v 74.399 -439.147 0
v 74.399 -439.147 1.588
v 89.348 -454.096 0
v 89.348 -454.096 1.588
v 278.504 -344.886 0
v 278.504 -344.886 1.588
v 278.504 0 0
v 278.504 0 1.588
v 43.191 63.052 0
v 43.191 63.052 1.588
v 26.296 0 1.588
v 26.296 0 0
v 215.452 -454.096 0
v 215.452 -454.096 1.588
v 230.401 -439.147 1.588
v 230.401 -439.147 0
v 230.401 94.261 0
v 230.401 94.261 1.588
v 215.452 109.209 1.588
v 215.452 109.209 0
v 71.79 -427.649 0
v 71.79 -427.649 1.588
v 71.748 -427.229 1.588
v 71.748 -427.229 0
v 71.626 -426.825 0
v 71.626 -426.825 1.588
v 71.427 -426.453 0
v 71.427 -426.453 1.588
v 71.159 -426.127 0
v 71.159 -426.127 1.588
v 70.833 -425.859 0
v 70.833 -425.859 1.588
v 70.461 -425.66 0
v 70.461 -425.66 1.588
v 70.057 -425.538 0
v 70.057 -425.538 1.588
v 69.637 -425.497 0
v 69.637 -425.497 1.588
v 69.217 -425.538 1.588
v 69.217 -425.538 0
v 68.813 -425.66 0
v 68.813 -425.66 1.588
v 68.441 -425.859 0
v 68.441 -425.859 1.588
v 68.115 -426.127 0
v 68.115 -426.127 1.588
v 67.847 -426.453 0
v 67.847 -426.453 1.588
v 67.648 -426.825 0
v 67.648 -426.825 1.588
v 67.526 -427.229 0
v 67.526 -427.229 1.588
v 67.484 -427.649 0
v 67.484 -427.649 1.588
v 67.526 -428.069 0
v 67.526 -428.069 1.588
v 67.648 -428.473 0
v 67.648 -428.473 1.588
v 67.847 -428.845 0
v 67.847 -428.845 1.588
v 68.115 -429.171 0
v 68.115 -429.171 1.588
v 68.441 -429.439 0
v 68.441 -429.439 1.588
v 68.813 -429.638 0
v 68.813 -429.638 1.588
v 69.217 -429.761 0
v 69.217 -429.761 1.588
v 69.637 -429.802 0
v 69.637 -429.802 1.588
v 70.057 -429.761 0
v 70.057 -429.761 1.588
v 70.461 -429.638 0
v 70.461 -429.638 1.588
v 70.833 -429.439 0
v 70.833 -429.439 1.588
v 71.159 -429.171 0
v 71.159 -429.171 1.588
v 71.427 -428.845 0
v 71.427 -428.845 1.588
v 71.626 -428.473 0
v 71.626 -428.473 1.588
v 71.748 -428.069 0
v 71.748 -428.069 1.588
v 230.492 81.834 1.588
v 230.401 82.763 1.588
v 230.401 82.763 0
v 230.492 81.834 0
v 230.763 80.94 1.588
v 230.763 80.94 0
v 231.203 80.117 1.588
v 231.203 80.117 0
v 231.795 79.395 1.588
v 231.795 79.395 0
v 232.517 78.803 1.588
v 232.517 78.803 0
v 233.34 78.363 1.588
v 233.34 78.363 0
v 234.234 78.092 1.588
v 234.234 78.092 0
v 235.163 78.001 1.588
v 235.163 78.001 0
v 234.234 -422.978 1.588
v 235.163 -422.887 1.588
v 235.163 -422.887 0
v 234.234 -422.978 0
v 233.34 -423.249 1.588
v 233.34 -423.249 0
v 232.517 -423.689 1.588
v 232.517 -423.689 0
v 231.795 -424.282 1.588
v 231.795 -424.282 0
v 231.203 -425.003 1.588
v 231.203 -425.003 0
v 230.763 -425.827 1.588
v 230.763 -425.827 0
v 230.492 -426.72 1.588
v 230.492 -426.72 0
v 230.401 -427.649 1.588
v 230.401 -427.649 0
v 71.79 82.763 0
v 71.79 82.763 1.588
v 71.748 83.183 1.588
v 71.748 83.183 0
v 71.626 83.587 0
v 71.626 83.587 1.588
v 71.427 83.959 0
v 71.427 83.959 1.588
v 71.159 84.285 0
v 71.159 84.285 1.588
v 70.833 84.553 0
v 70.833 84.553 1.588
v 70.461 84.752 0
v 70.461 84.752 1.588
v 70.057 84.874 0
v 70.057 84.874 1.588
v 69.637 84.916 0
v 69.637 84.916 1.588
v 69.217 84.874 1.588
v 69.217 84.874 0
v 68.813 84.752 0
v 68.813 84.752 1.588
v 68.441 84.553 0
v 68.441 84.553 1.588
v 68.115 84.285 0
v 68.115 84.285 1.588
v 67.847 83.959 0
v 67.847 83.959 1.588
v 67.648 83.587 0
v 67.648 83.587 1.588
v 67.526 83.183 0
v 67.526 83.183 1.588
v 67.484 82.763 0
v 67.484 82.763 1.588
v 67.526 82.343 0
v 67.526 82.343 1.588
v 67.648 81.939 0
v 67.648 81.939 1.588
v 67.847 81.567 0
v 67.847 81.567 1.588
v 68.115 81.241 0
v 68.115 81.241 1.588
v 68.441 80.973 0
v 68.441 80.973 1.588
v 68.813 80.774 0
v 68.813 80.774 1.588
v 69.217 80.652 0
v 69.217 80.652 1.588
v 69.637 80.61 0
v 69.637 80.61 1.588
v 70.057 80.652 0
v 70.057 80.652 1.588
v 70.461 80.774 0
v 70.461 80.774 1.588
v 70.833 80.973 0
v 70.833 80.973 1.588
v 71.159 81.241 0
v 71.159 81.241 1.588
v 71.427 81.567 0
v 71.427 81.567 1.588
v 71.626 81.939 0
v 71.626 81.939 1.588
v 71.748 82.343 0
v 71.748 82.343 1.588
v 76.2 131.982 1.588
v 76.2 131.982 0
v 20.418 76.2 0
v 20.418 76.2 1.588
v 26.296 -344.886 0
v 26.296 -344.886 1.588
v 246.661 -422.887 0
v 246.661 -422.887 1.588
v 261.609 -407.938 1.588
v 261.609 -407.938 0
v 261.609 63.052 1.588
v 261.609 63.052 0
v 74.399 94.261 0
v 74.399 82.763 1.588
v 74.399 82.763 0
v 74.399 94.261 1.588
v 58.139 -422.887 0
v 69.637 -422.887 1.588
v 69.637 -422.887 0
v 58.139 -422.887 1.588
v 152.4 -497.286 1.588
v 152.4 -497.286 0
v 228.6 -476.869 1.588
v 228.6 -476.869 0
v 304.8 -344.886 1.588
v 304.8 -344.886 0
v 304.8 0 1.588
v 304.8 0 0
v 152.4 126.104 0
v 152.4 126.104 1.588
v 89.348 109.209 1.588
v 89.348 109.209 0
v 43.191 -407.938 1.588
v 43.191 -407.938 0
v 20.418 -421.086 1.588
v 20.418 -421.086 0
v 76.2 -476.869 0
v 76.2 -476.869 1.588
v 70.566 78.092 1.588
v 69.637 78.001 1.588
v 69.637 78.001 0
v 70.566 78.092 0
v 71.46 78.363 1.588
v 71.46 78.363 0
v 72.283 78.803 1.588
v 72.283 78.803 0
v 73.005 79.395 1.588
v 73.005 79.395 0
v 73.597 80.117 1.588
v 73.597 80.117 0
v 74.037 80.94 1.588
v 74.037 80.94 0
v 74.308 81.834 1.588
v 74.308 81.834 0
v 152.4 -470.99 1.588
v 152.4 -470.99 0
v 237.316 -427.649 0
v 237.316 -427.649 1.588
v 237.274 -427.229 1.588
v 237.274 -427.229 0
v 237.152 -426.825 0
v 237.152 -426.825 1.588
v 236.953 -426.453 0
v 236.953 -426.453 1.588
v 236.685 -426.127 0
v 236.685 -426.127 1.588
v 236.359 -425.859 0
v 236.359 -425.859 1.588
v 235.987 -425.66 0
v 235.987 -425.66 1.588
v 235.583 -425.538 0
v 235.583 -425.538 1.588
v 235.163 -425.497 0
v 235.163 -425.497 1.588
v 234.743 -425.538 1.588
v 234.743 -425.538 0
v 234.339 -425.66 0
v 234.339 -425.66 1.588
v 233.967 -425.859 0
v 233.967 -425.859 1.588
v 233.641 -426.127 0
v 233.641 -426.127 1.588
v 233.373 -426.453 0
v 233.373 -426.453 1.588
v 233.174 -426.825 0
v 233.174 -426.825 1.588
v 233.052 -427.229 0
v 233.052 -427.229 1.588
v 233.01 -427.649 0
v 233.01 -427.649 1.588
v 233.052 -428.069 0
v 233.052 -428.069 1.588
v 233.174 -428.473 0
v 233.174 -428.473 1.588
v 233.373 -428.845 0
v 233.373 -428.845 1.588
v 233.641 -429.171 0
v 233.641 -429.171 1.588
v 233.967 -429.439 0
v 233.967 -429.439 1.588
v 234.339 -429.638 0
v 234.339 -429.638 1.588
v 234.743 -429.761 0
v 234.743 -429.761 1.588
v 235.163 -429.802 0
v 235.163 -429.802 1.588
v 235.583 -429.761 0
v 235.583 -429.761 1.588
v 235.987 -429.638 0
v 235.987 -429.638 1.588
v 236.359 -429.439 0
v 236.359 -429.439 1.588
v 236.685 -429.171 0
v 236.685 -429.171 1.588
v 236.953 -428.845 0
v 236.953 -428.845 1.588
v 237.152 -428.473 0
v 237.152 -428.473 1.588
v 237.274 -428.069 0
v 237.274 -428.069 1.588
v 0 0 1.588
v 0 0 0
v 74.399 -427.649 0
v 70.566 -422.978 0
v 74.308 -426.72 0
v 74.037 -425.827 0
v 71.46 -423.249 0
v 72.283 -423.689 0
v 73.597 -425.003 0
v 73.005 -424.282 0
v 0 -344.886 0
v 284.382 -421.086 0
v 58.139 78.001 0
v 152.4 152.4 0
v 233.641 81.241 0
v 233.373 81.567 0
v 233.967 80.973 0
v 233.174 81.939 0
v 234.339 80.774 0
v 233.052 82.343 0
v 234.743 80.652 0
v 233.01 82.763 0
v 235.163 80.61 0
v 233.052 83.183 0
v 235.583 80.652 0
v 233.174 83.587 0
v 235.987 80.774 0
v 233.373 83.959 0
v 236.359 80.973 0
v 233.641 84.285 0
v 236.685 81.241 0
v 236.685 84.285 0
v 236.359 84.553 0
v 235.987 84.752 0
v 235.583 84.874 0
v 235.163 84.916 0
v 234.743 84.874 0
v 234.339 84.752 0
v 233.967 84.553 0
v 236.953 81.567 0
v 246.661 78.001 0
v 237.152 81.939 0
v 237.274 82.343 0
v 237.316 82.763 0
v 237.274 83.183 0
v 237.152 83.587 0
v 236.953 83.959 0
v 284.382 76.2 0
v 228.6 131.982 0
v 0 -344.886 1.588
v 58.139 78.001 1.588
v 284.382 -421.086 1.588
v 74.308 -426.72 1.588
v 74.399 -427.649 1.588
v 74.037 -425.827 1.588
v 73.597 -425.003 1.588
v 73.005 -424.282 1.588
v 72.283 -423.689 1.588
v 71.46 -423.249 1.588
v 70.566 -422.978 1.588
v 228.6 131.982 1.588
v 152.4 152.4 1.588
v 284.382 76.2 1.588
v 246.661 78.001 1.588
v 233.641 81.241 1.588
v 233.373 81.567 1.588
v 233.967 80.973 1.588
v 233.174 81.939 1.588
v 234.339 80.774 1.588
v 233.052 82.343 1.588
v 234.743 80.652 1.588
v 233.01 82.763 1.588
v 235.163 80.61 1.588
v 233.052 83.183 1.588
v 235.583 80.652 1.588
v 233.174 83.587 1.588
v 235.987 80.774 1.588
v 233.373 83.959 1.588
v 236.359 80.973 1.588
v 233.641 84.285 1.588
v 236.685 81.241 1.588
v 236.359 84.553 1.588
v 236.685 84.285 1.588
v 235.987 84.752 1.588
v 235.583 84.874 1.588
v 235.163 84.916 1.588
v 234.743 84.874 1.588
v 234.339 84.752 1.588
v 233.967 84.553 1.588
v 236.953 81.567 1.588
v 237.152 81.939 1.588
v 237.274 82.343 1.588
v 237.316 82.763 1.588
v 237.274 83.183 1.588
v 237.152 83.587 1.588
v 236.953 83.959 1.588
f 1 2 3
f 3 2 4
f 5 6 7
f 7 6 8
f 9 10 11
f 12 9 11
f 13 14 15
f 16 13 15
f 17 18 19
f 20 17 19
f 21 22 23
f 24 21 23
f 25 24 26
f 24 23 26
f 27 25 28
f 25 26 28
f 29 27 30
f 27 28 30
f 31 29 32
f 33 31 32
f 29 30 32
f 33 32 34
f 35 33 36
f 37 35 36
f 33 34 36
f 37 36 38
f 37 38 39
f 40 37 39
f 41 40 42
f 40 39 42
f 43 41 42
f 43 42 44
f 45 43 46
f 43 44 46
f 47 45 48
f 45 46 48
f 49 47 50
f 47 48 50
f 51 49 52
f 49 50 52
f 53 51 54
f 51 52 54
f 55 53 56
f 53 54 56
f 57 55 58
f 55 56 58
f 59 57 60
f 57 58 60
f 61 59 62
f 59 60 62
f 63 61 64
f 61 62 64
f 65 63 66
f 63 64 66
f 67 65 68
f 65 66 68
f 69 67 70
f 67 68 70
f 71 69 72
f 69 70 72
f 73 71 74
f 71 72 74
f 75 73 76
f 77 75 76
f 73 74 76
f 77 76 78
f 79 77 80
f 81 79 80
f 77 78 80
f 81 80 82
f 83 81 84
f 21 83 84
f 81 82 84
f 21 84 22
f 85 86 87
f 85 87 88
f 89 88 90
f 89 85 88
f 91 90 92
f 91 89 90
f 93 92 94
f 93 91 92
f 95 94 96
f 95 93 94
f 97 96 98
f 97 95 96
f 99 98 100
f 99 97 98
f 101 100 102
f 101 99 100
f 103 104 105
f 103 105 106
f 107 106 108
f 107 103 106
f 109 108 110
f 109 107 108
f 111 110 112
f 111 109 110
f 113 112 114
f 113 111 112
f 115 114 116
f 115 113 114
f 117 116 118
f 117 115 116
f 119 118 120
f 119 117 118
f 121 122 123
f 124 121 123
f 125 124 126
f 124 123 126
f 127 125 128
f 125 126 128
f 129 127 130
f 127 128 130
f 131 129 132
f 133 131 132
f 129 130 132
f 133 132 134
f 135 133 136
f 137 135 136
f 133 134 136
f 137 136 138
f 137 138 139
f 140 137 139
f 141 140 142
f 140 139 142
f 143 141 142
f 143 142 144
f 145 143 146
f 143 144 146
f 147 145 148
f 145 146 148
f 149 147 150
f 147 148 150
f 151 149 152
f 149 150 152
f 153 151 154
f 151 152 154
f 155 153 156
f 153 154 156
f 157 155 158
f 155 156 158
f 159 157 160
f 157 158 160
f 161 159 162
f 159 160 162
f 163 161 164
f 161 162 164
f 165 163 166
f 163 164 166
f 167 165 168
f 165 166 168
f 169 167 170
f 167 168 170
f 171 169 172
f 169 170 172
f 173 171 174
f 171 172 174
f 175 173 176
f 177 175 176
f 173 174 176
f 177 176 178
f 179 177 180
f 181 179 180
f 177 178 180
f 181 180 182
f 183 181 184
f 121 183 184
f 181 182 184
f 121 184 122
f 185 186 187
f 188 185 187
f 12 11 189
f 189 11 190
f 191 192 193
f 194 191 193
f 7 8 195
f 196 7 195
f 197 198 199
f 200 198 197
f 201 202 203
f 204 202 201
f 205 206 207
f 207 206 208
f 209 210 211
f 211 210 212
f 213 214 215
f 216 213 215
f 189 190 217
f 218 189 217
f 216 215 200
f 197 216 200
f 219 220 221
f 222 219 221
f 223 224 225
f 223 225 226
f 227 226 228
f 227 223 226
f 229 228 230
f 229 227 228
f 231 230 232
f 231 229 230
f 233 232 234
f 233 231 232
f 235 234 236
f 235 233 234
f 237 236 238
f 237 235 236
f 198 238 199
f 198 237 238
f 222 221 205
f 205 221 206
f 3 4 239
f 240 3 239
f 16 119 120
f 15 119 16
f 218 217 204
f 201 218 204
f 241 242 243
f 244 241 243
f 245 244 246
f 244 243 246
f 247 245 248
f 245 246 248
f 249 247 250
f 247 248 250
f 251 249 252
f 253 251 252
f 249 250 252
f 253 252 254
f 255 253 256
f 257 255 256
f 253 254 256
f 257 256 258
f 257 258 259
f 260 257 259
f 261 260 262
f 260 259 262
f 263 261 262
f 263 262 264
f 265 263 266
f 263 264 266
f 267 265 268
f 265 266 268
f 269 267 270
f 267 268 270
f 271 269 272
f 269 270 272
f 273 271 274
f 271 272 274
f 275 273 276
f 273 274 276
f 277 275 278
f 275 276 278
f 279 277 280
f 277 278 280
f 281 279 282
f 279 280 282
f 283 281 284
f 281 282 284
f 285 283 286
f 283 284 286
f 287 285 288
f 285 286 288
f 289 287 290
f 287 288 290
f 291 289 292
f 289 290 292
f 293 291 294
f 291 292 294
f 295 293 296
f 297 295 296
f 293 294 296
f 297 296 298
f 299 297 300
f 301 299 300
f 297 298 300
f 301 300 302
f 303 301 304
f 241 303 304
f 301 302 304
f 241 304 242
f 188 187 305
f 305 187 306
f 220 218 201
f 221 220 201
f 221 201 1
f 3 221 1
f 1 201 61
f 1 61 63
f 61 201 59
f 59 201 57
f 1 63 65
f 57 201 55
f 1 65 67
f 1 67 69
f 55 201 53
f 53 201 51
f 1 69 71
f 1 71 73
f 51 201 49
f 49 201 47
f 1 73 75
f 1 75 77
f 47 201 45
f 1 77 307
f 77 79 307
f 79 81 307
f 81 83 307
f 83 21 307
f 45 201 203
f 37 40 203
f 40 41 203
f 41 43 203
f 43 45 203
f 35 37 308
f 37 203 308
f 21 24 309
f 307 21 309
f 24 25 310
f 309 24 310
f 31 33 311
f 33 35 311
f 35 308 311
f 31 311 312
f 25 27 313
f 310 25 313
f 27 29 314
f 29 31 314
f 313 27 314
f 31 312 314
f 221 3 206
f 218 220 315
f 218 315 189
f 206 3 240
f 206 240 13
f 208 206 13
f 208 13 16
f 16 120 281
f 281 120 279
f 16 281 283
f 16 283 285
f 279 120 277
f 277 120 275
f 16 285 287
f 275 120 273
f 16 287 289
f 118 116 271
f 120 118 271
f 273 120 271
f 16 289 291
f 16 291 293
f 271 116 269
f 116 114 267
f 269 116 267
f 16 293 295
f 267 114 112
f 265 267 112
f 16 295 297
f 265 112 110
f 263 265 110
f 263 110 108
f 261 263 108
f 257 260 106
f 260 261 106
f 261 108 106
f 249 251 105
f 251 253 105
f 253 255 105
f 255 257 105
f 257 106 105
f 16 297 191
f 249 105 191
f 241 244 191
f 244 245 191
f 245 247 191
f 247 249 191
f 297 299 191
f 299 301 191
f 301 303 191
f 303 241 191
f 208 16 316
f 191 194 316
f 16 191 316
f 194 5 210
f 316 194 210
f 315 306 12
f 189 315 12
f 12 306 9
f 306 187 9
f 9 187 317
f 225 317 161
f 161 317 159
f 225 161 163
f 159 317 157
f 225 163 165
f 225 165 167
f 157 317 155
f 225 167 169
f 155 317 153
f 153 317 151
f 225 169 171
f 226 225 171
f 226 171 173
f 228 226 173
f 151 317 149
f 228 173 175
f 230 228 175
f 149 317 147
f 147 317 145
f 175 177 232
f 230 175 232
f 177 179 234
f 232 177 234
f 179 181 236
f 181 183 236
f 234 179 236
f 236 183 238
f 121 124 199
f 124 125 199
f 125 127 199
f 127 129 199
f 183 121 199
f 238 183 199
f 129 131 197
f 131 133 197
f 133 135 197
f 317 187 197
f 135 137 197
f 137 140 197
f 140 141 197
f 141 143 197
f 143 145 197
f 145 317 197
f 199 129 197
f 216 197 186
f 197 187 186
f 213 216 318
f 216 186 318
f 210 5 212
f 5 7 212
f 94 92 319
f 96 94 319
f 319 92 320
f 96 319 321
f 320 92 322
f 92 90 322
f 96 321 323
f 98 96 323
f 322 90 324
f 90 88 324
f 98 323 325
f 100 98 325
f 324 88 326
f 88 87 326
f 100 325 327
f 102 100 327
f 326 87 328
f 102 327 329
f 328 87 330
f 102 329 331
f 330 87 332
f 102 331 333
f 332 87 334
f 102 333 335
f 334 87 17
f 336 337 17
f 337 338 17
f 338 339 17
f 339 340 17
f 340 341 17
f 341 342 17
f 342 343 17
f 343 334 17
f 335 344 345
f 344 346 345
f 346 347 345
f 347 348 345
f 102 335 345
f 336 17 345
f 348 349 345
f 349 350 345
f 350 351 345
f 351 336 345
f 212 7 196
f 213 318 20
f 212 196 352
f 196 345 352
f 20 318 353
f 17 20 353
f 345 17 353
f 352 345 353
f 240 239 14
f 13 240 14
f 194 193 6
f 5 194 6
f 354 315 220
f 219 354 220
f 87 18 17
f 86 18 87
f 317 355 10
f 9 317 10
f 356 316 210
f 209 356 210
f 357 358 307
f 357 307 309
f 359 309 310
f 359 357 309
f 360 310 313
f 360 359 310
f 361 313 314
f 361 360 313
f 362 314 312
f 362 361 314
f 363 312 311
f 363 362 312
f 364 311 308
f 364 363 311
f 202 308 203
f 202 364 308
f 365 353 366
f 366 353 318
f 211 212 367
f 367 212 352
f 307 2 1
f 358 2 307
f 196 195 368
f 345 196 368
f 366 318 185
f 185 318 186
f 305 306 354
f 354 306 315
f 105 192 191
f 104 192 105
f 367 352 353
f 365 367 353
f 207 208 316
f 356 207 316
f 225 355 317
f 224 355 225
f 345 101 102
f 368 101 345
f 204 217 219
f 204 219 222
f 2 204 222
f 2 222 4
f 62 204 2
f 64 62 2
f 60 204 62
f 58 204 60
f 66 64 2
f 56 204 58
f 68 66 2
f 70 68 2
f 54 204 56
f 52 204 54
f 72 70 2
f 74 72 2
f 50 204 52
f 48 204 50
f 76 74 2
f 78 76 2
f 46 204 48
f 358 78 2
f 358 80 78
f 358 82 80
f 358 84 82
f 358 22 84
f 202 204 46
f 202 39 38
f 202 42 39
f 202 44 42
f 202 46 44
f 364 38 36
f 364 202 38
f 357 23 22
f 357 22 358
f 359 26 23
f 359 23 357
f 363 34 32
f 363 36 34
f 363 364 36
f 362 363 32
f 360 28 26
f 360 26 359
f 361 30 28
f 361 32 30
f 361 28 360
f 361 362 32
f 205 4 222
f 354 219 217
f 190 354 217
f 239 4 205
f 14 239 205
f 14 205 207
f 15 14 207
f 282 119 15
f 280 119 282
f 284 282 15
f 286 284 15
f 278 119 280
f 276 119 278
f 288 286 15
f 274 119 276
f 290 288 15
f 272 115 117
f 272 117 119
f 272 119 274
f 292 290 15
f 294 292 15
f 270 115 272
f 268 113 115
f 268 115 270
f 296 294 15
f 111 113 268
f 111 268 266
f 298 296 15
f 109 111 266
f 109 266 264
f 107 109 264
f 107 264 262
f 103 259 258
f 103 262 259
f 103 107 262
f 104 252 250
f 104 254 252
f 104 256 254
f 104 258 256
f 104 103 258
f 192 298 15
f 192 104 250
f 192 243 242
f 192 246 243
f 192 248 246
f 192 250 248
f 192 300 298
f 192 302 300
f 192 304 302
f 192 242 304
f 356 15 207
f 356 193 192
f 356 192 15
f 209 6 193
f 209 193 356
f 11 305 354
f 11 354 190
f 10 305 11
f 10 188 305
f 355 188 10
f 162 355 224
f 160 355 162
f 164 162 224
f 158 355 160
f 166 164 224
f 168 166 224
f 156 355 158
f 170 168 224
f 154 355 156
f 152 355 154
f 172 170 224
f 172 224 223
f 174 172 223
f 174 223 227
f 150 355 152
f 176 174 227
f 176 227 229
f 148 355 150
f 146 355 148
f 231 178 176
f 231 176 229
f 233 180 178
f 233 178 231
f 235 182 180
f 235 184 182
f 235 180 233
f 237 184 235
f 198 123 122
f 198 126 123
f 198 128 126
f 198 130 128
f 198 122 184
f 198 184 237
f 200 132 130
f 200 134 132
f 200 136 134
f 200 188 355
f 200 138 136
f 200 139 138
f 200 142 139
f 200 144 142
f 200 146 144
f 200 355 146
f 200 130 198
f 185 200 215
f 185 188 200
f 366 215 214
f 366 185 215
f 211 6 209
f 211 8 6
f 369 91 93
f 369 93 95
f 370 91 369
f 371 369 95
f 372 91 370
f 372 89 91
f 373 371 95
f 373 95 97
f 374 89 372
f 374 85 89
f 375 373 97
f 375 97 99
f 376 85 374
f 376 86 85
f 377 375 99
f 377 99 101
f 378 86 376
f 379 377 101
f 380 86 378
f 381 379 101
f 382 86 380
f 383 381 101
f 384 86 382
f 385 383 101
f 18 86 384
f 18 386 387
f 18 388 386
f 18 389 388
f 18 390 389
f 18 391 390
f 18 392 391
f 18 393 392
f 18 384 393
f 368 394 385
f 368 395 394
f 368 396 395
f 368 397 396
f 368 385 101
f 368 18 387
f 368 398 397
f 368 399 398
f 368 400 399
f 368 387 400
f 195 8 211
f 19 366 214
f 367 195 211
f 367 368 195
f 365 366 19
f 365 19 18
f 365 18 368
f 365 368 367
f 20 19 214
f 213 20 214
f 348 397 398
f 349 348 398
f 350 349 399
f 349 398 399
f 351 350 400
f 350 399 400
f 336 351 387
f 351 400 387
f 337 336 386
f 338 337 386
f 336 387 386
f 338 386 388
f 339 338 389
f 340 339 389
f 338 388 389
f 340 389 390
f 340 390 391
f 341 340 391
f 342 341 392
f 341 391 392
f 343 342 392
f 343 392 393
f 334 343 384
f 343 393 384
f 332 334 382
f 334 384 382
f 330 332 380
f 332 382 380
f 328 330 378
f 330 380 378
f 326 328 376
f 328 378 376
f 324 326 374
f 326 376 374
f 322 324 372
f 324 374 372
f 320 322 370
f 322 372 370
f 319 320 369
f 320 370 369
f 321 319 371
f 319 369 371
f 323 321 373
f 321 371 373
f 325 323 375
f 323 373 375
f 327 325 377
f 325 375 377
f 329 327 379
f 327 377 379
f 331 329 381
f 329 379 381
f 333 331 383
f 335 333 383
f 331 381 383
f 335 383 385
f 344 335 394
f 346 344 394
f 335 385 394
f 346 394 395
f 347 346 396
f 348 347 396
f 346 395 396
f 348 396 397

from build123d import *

# Parameters (mm, degrees)
F1_DEPTH = 1.5875
F3_DEPTH = 1.5875
F4_R     = 2.15265
F5_DEPTH = 1.5875


with BuildPart() as f1:
    # F0 (on Top) → F1 (new body)
    with BuildSketch(Plane.XY):
        Polygon((304.8, -344.8862546), (304.8, 0), (284.3822715367, 76.2), (228.6, 131.9822715367), (152.4, 152.4), (76.2, 131.9822715367), (20.4177284633, 76.2), (0, 0), (0, -344.8862546), (20.4177284633, -421.0862546), (76.2, -476.8685261367), (152.4, -497.2862546), (228.6, -476.8685261367), (284.3822715367, -421.0862546), align=None)
    extrude(amount=F1_DEPTH)

    # F2 (on face) → F3 (cut, through all)
    with BuildSketch(Plane.XY.offset(1.5875)):
        Polygon((278.5039850176, -344.8862546), (278.5039850176, 0), (261.6092545437, 63.0519925088), (215.4519925088, 109.2092545437), (152.4, 126.1039850176), (89.3480074912, 109.2092545437), (43.1907454563, 63.0519925088), (26.2960149824, 0), (26.2960149824, -344.8862546), (43.1907454563, -407.9382471088), (89.3480074912, -454.0955091437), (152.4, -470.9902396176), (215.4519925088, -454.0955091437), (261.6092545437, -407.9382471088), align=None)
    extrude(amount=-F3_DEPTH, mode=Mode.SUBTRACT)

    # F4 (on face) → F5 (join, through all)
    with BuildSketch(Plane.XY.offset(1.5875)):
        with BuildLine():
            Line((246.6607195716, 78.0005274808), (230.4005274808, 94.2607195716))
            Line((230.4005274808, 94.2607195716), (230.4005274808, 82.7630274808))
            ThreePointArc((230.4005274808, 82.7630274808), (231.7954314354, 79.3954314354), (235.1630274808, 78.0005274808))
            Line((235.1630274808, 78.0005274808), (246.6607195716, 78.0005274808))
        make_face()
        with Locations((235.1630274808, 82.7630274808)):
            Circle(F4_R, mode=Mode.SUBTRACT)
        with BuildLine():
            ThreePointArc((69.6369725192, 78.0005274808), (73.0045685646, 79.3954314354), (74.3994725192, 82.7630274808))
            Line((74.3994725192, 82.7630274808), (74.3994725192, 94.2607195716))
            Line((74.3994725192, 94.2607195716), (58.1392804284, 78.0005274808))
            Line((58.1392804284, 78.0005274808), (69.6369725192, 78.0005274808))
        make_face()
        with Locations((69.6369725192, 82.7630274808)):
            Circle(F4_R, mode=Mode.SUBTRACT)
        with BuildLine():
            Line((69.6369725192, -422.8867820808), (58.1392804284, -422.8867820808))
            Line((58.1392804284, -422.8867820808), (74.3994725192, -439.1469741716))
            Line((74.3994725192, -439.1469741716), (74.3994725192, -427.6492820808))
            ThreePointArc((74.3994725192, -427.6492820808), (73.0045685646, -424.2816860354), (69.6369725192, -422.8867820808))
        make_face()
        with Locations((69.6369725192, -427.6492820808)):
            Circle(F4_R, mode=Mode.SUBTRACT)
        with BuildLine():
            Line((230.4005274808, -439.1469741716), (246.6607195716, -422.8867820808))
            Line((246.6607195716, -422.8867820808), (235.1630274808, -422.8867820808))
            ThreePointArc((235.1630274808, -422.8867820808), (231.7954314354, -424.2816860354), (230.4005274808, -427.6492820808))
            Line((230.4005274808, -427.6492820808), (230.4005274808, -439.1469741716))
        make_face()
        with Locations((235.1630274808, -427.6492820808)):
            Circle(F4_R, mode=Mode.SUBTRACT)
    extrude(amount=-F5_DEPTH)


solid = f1.part
